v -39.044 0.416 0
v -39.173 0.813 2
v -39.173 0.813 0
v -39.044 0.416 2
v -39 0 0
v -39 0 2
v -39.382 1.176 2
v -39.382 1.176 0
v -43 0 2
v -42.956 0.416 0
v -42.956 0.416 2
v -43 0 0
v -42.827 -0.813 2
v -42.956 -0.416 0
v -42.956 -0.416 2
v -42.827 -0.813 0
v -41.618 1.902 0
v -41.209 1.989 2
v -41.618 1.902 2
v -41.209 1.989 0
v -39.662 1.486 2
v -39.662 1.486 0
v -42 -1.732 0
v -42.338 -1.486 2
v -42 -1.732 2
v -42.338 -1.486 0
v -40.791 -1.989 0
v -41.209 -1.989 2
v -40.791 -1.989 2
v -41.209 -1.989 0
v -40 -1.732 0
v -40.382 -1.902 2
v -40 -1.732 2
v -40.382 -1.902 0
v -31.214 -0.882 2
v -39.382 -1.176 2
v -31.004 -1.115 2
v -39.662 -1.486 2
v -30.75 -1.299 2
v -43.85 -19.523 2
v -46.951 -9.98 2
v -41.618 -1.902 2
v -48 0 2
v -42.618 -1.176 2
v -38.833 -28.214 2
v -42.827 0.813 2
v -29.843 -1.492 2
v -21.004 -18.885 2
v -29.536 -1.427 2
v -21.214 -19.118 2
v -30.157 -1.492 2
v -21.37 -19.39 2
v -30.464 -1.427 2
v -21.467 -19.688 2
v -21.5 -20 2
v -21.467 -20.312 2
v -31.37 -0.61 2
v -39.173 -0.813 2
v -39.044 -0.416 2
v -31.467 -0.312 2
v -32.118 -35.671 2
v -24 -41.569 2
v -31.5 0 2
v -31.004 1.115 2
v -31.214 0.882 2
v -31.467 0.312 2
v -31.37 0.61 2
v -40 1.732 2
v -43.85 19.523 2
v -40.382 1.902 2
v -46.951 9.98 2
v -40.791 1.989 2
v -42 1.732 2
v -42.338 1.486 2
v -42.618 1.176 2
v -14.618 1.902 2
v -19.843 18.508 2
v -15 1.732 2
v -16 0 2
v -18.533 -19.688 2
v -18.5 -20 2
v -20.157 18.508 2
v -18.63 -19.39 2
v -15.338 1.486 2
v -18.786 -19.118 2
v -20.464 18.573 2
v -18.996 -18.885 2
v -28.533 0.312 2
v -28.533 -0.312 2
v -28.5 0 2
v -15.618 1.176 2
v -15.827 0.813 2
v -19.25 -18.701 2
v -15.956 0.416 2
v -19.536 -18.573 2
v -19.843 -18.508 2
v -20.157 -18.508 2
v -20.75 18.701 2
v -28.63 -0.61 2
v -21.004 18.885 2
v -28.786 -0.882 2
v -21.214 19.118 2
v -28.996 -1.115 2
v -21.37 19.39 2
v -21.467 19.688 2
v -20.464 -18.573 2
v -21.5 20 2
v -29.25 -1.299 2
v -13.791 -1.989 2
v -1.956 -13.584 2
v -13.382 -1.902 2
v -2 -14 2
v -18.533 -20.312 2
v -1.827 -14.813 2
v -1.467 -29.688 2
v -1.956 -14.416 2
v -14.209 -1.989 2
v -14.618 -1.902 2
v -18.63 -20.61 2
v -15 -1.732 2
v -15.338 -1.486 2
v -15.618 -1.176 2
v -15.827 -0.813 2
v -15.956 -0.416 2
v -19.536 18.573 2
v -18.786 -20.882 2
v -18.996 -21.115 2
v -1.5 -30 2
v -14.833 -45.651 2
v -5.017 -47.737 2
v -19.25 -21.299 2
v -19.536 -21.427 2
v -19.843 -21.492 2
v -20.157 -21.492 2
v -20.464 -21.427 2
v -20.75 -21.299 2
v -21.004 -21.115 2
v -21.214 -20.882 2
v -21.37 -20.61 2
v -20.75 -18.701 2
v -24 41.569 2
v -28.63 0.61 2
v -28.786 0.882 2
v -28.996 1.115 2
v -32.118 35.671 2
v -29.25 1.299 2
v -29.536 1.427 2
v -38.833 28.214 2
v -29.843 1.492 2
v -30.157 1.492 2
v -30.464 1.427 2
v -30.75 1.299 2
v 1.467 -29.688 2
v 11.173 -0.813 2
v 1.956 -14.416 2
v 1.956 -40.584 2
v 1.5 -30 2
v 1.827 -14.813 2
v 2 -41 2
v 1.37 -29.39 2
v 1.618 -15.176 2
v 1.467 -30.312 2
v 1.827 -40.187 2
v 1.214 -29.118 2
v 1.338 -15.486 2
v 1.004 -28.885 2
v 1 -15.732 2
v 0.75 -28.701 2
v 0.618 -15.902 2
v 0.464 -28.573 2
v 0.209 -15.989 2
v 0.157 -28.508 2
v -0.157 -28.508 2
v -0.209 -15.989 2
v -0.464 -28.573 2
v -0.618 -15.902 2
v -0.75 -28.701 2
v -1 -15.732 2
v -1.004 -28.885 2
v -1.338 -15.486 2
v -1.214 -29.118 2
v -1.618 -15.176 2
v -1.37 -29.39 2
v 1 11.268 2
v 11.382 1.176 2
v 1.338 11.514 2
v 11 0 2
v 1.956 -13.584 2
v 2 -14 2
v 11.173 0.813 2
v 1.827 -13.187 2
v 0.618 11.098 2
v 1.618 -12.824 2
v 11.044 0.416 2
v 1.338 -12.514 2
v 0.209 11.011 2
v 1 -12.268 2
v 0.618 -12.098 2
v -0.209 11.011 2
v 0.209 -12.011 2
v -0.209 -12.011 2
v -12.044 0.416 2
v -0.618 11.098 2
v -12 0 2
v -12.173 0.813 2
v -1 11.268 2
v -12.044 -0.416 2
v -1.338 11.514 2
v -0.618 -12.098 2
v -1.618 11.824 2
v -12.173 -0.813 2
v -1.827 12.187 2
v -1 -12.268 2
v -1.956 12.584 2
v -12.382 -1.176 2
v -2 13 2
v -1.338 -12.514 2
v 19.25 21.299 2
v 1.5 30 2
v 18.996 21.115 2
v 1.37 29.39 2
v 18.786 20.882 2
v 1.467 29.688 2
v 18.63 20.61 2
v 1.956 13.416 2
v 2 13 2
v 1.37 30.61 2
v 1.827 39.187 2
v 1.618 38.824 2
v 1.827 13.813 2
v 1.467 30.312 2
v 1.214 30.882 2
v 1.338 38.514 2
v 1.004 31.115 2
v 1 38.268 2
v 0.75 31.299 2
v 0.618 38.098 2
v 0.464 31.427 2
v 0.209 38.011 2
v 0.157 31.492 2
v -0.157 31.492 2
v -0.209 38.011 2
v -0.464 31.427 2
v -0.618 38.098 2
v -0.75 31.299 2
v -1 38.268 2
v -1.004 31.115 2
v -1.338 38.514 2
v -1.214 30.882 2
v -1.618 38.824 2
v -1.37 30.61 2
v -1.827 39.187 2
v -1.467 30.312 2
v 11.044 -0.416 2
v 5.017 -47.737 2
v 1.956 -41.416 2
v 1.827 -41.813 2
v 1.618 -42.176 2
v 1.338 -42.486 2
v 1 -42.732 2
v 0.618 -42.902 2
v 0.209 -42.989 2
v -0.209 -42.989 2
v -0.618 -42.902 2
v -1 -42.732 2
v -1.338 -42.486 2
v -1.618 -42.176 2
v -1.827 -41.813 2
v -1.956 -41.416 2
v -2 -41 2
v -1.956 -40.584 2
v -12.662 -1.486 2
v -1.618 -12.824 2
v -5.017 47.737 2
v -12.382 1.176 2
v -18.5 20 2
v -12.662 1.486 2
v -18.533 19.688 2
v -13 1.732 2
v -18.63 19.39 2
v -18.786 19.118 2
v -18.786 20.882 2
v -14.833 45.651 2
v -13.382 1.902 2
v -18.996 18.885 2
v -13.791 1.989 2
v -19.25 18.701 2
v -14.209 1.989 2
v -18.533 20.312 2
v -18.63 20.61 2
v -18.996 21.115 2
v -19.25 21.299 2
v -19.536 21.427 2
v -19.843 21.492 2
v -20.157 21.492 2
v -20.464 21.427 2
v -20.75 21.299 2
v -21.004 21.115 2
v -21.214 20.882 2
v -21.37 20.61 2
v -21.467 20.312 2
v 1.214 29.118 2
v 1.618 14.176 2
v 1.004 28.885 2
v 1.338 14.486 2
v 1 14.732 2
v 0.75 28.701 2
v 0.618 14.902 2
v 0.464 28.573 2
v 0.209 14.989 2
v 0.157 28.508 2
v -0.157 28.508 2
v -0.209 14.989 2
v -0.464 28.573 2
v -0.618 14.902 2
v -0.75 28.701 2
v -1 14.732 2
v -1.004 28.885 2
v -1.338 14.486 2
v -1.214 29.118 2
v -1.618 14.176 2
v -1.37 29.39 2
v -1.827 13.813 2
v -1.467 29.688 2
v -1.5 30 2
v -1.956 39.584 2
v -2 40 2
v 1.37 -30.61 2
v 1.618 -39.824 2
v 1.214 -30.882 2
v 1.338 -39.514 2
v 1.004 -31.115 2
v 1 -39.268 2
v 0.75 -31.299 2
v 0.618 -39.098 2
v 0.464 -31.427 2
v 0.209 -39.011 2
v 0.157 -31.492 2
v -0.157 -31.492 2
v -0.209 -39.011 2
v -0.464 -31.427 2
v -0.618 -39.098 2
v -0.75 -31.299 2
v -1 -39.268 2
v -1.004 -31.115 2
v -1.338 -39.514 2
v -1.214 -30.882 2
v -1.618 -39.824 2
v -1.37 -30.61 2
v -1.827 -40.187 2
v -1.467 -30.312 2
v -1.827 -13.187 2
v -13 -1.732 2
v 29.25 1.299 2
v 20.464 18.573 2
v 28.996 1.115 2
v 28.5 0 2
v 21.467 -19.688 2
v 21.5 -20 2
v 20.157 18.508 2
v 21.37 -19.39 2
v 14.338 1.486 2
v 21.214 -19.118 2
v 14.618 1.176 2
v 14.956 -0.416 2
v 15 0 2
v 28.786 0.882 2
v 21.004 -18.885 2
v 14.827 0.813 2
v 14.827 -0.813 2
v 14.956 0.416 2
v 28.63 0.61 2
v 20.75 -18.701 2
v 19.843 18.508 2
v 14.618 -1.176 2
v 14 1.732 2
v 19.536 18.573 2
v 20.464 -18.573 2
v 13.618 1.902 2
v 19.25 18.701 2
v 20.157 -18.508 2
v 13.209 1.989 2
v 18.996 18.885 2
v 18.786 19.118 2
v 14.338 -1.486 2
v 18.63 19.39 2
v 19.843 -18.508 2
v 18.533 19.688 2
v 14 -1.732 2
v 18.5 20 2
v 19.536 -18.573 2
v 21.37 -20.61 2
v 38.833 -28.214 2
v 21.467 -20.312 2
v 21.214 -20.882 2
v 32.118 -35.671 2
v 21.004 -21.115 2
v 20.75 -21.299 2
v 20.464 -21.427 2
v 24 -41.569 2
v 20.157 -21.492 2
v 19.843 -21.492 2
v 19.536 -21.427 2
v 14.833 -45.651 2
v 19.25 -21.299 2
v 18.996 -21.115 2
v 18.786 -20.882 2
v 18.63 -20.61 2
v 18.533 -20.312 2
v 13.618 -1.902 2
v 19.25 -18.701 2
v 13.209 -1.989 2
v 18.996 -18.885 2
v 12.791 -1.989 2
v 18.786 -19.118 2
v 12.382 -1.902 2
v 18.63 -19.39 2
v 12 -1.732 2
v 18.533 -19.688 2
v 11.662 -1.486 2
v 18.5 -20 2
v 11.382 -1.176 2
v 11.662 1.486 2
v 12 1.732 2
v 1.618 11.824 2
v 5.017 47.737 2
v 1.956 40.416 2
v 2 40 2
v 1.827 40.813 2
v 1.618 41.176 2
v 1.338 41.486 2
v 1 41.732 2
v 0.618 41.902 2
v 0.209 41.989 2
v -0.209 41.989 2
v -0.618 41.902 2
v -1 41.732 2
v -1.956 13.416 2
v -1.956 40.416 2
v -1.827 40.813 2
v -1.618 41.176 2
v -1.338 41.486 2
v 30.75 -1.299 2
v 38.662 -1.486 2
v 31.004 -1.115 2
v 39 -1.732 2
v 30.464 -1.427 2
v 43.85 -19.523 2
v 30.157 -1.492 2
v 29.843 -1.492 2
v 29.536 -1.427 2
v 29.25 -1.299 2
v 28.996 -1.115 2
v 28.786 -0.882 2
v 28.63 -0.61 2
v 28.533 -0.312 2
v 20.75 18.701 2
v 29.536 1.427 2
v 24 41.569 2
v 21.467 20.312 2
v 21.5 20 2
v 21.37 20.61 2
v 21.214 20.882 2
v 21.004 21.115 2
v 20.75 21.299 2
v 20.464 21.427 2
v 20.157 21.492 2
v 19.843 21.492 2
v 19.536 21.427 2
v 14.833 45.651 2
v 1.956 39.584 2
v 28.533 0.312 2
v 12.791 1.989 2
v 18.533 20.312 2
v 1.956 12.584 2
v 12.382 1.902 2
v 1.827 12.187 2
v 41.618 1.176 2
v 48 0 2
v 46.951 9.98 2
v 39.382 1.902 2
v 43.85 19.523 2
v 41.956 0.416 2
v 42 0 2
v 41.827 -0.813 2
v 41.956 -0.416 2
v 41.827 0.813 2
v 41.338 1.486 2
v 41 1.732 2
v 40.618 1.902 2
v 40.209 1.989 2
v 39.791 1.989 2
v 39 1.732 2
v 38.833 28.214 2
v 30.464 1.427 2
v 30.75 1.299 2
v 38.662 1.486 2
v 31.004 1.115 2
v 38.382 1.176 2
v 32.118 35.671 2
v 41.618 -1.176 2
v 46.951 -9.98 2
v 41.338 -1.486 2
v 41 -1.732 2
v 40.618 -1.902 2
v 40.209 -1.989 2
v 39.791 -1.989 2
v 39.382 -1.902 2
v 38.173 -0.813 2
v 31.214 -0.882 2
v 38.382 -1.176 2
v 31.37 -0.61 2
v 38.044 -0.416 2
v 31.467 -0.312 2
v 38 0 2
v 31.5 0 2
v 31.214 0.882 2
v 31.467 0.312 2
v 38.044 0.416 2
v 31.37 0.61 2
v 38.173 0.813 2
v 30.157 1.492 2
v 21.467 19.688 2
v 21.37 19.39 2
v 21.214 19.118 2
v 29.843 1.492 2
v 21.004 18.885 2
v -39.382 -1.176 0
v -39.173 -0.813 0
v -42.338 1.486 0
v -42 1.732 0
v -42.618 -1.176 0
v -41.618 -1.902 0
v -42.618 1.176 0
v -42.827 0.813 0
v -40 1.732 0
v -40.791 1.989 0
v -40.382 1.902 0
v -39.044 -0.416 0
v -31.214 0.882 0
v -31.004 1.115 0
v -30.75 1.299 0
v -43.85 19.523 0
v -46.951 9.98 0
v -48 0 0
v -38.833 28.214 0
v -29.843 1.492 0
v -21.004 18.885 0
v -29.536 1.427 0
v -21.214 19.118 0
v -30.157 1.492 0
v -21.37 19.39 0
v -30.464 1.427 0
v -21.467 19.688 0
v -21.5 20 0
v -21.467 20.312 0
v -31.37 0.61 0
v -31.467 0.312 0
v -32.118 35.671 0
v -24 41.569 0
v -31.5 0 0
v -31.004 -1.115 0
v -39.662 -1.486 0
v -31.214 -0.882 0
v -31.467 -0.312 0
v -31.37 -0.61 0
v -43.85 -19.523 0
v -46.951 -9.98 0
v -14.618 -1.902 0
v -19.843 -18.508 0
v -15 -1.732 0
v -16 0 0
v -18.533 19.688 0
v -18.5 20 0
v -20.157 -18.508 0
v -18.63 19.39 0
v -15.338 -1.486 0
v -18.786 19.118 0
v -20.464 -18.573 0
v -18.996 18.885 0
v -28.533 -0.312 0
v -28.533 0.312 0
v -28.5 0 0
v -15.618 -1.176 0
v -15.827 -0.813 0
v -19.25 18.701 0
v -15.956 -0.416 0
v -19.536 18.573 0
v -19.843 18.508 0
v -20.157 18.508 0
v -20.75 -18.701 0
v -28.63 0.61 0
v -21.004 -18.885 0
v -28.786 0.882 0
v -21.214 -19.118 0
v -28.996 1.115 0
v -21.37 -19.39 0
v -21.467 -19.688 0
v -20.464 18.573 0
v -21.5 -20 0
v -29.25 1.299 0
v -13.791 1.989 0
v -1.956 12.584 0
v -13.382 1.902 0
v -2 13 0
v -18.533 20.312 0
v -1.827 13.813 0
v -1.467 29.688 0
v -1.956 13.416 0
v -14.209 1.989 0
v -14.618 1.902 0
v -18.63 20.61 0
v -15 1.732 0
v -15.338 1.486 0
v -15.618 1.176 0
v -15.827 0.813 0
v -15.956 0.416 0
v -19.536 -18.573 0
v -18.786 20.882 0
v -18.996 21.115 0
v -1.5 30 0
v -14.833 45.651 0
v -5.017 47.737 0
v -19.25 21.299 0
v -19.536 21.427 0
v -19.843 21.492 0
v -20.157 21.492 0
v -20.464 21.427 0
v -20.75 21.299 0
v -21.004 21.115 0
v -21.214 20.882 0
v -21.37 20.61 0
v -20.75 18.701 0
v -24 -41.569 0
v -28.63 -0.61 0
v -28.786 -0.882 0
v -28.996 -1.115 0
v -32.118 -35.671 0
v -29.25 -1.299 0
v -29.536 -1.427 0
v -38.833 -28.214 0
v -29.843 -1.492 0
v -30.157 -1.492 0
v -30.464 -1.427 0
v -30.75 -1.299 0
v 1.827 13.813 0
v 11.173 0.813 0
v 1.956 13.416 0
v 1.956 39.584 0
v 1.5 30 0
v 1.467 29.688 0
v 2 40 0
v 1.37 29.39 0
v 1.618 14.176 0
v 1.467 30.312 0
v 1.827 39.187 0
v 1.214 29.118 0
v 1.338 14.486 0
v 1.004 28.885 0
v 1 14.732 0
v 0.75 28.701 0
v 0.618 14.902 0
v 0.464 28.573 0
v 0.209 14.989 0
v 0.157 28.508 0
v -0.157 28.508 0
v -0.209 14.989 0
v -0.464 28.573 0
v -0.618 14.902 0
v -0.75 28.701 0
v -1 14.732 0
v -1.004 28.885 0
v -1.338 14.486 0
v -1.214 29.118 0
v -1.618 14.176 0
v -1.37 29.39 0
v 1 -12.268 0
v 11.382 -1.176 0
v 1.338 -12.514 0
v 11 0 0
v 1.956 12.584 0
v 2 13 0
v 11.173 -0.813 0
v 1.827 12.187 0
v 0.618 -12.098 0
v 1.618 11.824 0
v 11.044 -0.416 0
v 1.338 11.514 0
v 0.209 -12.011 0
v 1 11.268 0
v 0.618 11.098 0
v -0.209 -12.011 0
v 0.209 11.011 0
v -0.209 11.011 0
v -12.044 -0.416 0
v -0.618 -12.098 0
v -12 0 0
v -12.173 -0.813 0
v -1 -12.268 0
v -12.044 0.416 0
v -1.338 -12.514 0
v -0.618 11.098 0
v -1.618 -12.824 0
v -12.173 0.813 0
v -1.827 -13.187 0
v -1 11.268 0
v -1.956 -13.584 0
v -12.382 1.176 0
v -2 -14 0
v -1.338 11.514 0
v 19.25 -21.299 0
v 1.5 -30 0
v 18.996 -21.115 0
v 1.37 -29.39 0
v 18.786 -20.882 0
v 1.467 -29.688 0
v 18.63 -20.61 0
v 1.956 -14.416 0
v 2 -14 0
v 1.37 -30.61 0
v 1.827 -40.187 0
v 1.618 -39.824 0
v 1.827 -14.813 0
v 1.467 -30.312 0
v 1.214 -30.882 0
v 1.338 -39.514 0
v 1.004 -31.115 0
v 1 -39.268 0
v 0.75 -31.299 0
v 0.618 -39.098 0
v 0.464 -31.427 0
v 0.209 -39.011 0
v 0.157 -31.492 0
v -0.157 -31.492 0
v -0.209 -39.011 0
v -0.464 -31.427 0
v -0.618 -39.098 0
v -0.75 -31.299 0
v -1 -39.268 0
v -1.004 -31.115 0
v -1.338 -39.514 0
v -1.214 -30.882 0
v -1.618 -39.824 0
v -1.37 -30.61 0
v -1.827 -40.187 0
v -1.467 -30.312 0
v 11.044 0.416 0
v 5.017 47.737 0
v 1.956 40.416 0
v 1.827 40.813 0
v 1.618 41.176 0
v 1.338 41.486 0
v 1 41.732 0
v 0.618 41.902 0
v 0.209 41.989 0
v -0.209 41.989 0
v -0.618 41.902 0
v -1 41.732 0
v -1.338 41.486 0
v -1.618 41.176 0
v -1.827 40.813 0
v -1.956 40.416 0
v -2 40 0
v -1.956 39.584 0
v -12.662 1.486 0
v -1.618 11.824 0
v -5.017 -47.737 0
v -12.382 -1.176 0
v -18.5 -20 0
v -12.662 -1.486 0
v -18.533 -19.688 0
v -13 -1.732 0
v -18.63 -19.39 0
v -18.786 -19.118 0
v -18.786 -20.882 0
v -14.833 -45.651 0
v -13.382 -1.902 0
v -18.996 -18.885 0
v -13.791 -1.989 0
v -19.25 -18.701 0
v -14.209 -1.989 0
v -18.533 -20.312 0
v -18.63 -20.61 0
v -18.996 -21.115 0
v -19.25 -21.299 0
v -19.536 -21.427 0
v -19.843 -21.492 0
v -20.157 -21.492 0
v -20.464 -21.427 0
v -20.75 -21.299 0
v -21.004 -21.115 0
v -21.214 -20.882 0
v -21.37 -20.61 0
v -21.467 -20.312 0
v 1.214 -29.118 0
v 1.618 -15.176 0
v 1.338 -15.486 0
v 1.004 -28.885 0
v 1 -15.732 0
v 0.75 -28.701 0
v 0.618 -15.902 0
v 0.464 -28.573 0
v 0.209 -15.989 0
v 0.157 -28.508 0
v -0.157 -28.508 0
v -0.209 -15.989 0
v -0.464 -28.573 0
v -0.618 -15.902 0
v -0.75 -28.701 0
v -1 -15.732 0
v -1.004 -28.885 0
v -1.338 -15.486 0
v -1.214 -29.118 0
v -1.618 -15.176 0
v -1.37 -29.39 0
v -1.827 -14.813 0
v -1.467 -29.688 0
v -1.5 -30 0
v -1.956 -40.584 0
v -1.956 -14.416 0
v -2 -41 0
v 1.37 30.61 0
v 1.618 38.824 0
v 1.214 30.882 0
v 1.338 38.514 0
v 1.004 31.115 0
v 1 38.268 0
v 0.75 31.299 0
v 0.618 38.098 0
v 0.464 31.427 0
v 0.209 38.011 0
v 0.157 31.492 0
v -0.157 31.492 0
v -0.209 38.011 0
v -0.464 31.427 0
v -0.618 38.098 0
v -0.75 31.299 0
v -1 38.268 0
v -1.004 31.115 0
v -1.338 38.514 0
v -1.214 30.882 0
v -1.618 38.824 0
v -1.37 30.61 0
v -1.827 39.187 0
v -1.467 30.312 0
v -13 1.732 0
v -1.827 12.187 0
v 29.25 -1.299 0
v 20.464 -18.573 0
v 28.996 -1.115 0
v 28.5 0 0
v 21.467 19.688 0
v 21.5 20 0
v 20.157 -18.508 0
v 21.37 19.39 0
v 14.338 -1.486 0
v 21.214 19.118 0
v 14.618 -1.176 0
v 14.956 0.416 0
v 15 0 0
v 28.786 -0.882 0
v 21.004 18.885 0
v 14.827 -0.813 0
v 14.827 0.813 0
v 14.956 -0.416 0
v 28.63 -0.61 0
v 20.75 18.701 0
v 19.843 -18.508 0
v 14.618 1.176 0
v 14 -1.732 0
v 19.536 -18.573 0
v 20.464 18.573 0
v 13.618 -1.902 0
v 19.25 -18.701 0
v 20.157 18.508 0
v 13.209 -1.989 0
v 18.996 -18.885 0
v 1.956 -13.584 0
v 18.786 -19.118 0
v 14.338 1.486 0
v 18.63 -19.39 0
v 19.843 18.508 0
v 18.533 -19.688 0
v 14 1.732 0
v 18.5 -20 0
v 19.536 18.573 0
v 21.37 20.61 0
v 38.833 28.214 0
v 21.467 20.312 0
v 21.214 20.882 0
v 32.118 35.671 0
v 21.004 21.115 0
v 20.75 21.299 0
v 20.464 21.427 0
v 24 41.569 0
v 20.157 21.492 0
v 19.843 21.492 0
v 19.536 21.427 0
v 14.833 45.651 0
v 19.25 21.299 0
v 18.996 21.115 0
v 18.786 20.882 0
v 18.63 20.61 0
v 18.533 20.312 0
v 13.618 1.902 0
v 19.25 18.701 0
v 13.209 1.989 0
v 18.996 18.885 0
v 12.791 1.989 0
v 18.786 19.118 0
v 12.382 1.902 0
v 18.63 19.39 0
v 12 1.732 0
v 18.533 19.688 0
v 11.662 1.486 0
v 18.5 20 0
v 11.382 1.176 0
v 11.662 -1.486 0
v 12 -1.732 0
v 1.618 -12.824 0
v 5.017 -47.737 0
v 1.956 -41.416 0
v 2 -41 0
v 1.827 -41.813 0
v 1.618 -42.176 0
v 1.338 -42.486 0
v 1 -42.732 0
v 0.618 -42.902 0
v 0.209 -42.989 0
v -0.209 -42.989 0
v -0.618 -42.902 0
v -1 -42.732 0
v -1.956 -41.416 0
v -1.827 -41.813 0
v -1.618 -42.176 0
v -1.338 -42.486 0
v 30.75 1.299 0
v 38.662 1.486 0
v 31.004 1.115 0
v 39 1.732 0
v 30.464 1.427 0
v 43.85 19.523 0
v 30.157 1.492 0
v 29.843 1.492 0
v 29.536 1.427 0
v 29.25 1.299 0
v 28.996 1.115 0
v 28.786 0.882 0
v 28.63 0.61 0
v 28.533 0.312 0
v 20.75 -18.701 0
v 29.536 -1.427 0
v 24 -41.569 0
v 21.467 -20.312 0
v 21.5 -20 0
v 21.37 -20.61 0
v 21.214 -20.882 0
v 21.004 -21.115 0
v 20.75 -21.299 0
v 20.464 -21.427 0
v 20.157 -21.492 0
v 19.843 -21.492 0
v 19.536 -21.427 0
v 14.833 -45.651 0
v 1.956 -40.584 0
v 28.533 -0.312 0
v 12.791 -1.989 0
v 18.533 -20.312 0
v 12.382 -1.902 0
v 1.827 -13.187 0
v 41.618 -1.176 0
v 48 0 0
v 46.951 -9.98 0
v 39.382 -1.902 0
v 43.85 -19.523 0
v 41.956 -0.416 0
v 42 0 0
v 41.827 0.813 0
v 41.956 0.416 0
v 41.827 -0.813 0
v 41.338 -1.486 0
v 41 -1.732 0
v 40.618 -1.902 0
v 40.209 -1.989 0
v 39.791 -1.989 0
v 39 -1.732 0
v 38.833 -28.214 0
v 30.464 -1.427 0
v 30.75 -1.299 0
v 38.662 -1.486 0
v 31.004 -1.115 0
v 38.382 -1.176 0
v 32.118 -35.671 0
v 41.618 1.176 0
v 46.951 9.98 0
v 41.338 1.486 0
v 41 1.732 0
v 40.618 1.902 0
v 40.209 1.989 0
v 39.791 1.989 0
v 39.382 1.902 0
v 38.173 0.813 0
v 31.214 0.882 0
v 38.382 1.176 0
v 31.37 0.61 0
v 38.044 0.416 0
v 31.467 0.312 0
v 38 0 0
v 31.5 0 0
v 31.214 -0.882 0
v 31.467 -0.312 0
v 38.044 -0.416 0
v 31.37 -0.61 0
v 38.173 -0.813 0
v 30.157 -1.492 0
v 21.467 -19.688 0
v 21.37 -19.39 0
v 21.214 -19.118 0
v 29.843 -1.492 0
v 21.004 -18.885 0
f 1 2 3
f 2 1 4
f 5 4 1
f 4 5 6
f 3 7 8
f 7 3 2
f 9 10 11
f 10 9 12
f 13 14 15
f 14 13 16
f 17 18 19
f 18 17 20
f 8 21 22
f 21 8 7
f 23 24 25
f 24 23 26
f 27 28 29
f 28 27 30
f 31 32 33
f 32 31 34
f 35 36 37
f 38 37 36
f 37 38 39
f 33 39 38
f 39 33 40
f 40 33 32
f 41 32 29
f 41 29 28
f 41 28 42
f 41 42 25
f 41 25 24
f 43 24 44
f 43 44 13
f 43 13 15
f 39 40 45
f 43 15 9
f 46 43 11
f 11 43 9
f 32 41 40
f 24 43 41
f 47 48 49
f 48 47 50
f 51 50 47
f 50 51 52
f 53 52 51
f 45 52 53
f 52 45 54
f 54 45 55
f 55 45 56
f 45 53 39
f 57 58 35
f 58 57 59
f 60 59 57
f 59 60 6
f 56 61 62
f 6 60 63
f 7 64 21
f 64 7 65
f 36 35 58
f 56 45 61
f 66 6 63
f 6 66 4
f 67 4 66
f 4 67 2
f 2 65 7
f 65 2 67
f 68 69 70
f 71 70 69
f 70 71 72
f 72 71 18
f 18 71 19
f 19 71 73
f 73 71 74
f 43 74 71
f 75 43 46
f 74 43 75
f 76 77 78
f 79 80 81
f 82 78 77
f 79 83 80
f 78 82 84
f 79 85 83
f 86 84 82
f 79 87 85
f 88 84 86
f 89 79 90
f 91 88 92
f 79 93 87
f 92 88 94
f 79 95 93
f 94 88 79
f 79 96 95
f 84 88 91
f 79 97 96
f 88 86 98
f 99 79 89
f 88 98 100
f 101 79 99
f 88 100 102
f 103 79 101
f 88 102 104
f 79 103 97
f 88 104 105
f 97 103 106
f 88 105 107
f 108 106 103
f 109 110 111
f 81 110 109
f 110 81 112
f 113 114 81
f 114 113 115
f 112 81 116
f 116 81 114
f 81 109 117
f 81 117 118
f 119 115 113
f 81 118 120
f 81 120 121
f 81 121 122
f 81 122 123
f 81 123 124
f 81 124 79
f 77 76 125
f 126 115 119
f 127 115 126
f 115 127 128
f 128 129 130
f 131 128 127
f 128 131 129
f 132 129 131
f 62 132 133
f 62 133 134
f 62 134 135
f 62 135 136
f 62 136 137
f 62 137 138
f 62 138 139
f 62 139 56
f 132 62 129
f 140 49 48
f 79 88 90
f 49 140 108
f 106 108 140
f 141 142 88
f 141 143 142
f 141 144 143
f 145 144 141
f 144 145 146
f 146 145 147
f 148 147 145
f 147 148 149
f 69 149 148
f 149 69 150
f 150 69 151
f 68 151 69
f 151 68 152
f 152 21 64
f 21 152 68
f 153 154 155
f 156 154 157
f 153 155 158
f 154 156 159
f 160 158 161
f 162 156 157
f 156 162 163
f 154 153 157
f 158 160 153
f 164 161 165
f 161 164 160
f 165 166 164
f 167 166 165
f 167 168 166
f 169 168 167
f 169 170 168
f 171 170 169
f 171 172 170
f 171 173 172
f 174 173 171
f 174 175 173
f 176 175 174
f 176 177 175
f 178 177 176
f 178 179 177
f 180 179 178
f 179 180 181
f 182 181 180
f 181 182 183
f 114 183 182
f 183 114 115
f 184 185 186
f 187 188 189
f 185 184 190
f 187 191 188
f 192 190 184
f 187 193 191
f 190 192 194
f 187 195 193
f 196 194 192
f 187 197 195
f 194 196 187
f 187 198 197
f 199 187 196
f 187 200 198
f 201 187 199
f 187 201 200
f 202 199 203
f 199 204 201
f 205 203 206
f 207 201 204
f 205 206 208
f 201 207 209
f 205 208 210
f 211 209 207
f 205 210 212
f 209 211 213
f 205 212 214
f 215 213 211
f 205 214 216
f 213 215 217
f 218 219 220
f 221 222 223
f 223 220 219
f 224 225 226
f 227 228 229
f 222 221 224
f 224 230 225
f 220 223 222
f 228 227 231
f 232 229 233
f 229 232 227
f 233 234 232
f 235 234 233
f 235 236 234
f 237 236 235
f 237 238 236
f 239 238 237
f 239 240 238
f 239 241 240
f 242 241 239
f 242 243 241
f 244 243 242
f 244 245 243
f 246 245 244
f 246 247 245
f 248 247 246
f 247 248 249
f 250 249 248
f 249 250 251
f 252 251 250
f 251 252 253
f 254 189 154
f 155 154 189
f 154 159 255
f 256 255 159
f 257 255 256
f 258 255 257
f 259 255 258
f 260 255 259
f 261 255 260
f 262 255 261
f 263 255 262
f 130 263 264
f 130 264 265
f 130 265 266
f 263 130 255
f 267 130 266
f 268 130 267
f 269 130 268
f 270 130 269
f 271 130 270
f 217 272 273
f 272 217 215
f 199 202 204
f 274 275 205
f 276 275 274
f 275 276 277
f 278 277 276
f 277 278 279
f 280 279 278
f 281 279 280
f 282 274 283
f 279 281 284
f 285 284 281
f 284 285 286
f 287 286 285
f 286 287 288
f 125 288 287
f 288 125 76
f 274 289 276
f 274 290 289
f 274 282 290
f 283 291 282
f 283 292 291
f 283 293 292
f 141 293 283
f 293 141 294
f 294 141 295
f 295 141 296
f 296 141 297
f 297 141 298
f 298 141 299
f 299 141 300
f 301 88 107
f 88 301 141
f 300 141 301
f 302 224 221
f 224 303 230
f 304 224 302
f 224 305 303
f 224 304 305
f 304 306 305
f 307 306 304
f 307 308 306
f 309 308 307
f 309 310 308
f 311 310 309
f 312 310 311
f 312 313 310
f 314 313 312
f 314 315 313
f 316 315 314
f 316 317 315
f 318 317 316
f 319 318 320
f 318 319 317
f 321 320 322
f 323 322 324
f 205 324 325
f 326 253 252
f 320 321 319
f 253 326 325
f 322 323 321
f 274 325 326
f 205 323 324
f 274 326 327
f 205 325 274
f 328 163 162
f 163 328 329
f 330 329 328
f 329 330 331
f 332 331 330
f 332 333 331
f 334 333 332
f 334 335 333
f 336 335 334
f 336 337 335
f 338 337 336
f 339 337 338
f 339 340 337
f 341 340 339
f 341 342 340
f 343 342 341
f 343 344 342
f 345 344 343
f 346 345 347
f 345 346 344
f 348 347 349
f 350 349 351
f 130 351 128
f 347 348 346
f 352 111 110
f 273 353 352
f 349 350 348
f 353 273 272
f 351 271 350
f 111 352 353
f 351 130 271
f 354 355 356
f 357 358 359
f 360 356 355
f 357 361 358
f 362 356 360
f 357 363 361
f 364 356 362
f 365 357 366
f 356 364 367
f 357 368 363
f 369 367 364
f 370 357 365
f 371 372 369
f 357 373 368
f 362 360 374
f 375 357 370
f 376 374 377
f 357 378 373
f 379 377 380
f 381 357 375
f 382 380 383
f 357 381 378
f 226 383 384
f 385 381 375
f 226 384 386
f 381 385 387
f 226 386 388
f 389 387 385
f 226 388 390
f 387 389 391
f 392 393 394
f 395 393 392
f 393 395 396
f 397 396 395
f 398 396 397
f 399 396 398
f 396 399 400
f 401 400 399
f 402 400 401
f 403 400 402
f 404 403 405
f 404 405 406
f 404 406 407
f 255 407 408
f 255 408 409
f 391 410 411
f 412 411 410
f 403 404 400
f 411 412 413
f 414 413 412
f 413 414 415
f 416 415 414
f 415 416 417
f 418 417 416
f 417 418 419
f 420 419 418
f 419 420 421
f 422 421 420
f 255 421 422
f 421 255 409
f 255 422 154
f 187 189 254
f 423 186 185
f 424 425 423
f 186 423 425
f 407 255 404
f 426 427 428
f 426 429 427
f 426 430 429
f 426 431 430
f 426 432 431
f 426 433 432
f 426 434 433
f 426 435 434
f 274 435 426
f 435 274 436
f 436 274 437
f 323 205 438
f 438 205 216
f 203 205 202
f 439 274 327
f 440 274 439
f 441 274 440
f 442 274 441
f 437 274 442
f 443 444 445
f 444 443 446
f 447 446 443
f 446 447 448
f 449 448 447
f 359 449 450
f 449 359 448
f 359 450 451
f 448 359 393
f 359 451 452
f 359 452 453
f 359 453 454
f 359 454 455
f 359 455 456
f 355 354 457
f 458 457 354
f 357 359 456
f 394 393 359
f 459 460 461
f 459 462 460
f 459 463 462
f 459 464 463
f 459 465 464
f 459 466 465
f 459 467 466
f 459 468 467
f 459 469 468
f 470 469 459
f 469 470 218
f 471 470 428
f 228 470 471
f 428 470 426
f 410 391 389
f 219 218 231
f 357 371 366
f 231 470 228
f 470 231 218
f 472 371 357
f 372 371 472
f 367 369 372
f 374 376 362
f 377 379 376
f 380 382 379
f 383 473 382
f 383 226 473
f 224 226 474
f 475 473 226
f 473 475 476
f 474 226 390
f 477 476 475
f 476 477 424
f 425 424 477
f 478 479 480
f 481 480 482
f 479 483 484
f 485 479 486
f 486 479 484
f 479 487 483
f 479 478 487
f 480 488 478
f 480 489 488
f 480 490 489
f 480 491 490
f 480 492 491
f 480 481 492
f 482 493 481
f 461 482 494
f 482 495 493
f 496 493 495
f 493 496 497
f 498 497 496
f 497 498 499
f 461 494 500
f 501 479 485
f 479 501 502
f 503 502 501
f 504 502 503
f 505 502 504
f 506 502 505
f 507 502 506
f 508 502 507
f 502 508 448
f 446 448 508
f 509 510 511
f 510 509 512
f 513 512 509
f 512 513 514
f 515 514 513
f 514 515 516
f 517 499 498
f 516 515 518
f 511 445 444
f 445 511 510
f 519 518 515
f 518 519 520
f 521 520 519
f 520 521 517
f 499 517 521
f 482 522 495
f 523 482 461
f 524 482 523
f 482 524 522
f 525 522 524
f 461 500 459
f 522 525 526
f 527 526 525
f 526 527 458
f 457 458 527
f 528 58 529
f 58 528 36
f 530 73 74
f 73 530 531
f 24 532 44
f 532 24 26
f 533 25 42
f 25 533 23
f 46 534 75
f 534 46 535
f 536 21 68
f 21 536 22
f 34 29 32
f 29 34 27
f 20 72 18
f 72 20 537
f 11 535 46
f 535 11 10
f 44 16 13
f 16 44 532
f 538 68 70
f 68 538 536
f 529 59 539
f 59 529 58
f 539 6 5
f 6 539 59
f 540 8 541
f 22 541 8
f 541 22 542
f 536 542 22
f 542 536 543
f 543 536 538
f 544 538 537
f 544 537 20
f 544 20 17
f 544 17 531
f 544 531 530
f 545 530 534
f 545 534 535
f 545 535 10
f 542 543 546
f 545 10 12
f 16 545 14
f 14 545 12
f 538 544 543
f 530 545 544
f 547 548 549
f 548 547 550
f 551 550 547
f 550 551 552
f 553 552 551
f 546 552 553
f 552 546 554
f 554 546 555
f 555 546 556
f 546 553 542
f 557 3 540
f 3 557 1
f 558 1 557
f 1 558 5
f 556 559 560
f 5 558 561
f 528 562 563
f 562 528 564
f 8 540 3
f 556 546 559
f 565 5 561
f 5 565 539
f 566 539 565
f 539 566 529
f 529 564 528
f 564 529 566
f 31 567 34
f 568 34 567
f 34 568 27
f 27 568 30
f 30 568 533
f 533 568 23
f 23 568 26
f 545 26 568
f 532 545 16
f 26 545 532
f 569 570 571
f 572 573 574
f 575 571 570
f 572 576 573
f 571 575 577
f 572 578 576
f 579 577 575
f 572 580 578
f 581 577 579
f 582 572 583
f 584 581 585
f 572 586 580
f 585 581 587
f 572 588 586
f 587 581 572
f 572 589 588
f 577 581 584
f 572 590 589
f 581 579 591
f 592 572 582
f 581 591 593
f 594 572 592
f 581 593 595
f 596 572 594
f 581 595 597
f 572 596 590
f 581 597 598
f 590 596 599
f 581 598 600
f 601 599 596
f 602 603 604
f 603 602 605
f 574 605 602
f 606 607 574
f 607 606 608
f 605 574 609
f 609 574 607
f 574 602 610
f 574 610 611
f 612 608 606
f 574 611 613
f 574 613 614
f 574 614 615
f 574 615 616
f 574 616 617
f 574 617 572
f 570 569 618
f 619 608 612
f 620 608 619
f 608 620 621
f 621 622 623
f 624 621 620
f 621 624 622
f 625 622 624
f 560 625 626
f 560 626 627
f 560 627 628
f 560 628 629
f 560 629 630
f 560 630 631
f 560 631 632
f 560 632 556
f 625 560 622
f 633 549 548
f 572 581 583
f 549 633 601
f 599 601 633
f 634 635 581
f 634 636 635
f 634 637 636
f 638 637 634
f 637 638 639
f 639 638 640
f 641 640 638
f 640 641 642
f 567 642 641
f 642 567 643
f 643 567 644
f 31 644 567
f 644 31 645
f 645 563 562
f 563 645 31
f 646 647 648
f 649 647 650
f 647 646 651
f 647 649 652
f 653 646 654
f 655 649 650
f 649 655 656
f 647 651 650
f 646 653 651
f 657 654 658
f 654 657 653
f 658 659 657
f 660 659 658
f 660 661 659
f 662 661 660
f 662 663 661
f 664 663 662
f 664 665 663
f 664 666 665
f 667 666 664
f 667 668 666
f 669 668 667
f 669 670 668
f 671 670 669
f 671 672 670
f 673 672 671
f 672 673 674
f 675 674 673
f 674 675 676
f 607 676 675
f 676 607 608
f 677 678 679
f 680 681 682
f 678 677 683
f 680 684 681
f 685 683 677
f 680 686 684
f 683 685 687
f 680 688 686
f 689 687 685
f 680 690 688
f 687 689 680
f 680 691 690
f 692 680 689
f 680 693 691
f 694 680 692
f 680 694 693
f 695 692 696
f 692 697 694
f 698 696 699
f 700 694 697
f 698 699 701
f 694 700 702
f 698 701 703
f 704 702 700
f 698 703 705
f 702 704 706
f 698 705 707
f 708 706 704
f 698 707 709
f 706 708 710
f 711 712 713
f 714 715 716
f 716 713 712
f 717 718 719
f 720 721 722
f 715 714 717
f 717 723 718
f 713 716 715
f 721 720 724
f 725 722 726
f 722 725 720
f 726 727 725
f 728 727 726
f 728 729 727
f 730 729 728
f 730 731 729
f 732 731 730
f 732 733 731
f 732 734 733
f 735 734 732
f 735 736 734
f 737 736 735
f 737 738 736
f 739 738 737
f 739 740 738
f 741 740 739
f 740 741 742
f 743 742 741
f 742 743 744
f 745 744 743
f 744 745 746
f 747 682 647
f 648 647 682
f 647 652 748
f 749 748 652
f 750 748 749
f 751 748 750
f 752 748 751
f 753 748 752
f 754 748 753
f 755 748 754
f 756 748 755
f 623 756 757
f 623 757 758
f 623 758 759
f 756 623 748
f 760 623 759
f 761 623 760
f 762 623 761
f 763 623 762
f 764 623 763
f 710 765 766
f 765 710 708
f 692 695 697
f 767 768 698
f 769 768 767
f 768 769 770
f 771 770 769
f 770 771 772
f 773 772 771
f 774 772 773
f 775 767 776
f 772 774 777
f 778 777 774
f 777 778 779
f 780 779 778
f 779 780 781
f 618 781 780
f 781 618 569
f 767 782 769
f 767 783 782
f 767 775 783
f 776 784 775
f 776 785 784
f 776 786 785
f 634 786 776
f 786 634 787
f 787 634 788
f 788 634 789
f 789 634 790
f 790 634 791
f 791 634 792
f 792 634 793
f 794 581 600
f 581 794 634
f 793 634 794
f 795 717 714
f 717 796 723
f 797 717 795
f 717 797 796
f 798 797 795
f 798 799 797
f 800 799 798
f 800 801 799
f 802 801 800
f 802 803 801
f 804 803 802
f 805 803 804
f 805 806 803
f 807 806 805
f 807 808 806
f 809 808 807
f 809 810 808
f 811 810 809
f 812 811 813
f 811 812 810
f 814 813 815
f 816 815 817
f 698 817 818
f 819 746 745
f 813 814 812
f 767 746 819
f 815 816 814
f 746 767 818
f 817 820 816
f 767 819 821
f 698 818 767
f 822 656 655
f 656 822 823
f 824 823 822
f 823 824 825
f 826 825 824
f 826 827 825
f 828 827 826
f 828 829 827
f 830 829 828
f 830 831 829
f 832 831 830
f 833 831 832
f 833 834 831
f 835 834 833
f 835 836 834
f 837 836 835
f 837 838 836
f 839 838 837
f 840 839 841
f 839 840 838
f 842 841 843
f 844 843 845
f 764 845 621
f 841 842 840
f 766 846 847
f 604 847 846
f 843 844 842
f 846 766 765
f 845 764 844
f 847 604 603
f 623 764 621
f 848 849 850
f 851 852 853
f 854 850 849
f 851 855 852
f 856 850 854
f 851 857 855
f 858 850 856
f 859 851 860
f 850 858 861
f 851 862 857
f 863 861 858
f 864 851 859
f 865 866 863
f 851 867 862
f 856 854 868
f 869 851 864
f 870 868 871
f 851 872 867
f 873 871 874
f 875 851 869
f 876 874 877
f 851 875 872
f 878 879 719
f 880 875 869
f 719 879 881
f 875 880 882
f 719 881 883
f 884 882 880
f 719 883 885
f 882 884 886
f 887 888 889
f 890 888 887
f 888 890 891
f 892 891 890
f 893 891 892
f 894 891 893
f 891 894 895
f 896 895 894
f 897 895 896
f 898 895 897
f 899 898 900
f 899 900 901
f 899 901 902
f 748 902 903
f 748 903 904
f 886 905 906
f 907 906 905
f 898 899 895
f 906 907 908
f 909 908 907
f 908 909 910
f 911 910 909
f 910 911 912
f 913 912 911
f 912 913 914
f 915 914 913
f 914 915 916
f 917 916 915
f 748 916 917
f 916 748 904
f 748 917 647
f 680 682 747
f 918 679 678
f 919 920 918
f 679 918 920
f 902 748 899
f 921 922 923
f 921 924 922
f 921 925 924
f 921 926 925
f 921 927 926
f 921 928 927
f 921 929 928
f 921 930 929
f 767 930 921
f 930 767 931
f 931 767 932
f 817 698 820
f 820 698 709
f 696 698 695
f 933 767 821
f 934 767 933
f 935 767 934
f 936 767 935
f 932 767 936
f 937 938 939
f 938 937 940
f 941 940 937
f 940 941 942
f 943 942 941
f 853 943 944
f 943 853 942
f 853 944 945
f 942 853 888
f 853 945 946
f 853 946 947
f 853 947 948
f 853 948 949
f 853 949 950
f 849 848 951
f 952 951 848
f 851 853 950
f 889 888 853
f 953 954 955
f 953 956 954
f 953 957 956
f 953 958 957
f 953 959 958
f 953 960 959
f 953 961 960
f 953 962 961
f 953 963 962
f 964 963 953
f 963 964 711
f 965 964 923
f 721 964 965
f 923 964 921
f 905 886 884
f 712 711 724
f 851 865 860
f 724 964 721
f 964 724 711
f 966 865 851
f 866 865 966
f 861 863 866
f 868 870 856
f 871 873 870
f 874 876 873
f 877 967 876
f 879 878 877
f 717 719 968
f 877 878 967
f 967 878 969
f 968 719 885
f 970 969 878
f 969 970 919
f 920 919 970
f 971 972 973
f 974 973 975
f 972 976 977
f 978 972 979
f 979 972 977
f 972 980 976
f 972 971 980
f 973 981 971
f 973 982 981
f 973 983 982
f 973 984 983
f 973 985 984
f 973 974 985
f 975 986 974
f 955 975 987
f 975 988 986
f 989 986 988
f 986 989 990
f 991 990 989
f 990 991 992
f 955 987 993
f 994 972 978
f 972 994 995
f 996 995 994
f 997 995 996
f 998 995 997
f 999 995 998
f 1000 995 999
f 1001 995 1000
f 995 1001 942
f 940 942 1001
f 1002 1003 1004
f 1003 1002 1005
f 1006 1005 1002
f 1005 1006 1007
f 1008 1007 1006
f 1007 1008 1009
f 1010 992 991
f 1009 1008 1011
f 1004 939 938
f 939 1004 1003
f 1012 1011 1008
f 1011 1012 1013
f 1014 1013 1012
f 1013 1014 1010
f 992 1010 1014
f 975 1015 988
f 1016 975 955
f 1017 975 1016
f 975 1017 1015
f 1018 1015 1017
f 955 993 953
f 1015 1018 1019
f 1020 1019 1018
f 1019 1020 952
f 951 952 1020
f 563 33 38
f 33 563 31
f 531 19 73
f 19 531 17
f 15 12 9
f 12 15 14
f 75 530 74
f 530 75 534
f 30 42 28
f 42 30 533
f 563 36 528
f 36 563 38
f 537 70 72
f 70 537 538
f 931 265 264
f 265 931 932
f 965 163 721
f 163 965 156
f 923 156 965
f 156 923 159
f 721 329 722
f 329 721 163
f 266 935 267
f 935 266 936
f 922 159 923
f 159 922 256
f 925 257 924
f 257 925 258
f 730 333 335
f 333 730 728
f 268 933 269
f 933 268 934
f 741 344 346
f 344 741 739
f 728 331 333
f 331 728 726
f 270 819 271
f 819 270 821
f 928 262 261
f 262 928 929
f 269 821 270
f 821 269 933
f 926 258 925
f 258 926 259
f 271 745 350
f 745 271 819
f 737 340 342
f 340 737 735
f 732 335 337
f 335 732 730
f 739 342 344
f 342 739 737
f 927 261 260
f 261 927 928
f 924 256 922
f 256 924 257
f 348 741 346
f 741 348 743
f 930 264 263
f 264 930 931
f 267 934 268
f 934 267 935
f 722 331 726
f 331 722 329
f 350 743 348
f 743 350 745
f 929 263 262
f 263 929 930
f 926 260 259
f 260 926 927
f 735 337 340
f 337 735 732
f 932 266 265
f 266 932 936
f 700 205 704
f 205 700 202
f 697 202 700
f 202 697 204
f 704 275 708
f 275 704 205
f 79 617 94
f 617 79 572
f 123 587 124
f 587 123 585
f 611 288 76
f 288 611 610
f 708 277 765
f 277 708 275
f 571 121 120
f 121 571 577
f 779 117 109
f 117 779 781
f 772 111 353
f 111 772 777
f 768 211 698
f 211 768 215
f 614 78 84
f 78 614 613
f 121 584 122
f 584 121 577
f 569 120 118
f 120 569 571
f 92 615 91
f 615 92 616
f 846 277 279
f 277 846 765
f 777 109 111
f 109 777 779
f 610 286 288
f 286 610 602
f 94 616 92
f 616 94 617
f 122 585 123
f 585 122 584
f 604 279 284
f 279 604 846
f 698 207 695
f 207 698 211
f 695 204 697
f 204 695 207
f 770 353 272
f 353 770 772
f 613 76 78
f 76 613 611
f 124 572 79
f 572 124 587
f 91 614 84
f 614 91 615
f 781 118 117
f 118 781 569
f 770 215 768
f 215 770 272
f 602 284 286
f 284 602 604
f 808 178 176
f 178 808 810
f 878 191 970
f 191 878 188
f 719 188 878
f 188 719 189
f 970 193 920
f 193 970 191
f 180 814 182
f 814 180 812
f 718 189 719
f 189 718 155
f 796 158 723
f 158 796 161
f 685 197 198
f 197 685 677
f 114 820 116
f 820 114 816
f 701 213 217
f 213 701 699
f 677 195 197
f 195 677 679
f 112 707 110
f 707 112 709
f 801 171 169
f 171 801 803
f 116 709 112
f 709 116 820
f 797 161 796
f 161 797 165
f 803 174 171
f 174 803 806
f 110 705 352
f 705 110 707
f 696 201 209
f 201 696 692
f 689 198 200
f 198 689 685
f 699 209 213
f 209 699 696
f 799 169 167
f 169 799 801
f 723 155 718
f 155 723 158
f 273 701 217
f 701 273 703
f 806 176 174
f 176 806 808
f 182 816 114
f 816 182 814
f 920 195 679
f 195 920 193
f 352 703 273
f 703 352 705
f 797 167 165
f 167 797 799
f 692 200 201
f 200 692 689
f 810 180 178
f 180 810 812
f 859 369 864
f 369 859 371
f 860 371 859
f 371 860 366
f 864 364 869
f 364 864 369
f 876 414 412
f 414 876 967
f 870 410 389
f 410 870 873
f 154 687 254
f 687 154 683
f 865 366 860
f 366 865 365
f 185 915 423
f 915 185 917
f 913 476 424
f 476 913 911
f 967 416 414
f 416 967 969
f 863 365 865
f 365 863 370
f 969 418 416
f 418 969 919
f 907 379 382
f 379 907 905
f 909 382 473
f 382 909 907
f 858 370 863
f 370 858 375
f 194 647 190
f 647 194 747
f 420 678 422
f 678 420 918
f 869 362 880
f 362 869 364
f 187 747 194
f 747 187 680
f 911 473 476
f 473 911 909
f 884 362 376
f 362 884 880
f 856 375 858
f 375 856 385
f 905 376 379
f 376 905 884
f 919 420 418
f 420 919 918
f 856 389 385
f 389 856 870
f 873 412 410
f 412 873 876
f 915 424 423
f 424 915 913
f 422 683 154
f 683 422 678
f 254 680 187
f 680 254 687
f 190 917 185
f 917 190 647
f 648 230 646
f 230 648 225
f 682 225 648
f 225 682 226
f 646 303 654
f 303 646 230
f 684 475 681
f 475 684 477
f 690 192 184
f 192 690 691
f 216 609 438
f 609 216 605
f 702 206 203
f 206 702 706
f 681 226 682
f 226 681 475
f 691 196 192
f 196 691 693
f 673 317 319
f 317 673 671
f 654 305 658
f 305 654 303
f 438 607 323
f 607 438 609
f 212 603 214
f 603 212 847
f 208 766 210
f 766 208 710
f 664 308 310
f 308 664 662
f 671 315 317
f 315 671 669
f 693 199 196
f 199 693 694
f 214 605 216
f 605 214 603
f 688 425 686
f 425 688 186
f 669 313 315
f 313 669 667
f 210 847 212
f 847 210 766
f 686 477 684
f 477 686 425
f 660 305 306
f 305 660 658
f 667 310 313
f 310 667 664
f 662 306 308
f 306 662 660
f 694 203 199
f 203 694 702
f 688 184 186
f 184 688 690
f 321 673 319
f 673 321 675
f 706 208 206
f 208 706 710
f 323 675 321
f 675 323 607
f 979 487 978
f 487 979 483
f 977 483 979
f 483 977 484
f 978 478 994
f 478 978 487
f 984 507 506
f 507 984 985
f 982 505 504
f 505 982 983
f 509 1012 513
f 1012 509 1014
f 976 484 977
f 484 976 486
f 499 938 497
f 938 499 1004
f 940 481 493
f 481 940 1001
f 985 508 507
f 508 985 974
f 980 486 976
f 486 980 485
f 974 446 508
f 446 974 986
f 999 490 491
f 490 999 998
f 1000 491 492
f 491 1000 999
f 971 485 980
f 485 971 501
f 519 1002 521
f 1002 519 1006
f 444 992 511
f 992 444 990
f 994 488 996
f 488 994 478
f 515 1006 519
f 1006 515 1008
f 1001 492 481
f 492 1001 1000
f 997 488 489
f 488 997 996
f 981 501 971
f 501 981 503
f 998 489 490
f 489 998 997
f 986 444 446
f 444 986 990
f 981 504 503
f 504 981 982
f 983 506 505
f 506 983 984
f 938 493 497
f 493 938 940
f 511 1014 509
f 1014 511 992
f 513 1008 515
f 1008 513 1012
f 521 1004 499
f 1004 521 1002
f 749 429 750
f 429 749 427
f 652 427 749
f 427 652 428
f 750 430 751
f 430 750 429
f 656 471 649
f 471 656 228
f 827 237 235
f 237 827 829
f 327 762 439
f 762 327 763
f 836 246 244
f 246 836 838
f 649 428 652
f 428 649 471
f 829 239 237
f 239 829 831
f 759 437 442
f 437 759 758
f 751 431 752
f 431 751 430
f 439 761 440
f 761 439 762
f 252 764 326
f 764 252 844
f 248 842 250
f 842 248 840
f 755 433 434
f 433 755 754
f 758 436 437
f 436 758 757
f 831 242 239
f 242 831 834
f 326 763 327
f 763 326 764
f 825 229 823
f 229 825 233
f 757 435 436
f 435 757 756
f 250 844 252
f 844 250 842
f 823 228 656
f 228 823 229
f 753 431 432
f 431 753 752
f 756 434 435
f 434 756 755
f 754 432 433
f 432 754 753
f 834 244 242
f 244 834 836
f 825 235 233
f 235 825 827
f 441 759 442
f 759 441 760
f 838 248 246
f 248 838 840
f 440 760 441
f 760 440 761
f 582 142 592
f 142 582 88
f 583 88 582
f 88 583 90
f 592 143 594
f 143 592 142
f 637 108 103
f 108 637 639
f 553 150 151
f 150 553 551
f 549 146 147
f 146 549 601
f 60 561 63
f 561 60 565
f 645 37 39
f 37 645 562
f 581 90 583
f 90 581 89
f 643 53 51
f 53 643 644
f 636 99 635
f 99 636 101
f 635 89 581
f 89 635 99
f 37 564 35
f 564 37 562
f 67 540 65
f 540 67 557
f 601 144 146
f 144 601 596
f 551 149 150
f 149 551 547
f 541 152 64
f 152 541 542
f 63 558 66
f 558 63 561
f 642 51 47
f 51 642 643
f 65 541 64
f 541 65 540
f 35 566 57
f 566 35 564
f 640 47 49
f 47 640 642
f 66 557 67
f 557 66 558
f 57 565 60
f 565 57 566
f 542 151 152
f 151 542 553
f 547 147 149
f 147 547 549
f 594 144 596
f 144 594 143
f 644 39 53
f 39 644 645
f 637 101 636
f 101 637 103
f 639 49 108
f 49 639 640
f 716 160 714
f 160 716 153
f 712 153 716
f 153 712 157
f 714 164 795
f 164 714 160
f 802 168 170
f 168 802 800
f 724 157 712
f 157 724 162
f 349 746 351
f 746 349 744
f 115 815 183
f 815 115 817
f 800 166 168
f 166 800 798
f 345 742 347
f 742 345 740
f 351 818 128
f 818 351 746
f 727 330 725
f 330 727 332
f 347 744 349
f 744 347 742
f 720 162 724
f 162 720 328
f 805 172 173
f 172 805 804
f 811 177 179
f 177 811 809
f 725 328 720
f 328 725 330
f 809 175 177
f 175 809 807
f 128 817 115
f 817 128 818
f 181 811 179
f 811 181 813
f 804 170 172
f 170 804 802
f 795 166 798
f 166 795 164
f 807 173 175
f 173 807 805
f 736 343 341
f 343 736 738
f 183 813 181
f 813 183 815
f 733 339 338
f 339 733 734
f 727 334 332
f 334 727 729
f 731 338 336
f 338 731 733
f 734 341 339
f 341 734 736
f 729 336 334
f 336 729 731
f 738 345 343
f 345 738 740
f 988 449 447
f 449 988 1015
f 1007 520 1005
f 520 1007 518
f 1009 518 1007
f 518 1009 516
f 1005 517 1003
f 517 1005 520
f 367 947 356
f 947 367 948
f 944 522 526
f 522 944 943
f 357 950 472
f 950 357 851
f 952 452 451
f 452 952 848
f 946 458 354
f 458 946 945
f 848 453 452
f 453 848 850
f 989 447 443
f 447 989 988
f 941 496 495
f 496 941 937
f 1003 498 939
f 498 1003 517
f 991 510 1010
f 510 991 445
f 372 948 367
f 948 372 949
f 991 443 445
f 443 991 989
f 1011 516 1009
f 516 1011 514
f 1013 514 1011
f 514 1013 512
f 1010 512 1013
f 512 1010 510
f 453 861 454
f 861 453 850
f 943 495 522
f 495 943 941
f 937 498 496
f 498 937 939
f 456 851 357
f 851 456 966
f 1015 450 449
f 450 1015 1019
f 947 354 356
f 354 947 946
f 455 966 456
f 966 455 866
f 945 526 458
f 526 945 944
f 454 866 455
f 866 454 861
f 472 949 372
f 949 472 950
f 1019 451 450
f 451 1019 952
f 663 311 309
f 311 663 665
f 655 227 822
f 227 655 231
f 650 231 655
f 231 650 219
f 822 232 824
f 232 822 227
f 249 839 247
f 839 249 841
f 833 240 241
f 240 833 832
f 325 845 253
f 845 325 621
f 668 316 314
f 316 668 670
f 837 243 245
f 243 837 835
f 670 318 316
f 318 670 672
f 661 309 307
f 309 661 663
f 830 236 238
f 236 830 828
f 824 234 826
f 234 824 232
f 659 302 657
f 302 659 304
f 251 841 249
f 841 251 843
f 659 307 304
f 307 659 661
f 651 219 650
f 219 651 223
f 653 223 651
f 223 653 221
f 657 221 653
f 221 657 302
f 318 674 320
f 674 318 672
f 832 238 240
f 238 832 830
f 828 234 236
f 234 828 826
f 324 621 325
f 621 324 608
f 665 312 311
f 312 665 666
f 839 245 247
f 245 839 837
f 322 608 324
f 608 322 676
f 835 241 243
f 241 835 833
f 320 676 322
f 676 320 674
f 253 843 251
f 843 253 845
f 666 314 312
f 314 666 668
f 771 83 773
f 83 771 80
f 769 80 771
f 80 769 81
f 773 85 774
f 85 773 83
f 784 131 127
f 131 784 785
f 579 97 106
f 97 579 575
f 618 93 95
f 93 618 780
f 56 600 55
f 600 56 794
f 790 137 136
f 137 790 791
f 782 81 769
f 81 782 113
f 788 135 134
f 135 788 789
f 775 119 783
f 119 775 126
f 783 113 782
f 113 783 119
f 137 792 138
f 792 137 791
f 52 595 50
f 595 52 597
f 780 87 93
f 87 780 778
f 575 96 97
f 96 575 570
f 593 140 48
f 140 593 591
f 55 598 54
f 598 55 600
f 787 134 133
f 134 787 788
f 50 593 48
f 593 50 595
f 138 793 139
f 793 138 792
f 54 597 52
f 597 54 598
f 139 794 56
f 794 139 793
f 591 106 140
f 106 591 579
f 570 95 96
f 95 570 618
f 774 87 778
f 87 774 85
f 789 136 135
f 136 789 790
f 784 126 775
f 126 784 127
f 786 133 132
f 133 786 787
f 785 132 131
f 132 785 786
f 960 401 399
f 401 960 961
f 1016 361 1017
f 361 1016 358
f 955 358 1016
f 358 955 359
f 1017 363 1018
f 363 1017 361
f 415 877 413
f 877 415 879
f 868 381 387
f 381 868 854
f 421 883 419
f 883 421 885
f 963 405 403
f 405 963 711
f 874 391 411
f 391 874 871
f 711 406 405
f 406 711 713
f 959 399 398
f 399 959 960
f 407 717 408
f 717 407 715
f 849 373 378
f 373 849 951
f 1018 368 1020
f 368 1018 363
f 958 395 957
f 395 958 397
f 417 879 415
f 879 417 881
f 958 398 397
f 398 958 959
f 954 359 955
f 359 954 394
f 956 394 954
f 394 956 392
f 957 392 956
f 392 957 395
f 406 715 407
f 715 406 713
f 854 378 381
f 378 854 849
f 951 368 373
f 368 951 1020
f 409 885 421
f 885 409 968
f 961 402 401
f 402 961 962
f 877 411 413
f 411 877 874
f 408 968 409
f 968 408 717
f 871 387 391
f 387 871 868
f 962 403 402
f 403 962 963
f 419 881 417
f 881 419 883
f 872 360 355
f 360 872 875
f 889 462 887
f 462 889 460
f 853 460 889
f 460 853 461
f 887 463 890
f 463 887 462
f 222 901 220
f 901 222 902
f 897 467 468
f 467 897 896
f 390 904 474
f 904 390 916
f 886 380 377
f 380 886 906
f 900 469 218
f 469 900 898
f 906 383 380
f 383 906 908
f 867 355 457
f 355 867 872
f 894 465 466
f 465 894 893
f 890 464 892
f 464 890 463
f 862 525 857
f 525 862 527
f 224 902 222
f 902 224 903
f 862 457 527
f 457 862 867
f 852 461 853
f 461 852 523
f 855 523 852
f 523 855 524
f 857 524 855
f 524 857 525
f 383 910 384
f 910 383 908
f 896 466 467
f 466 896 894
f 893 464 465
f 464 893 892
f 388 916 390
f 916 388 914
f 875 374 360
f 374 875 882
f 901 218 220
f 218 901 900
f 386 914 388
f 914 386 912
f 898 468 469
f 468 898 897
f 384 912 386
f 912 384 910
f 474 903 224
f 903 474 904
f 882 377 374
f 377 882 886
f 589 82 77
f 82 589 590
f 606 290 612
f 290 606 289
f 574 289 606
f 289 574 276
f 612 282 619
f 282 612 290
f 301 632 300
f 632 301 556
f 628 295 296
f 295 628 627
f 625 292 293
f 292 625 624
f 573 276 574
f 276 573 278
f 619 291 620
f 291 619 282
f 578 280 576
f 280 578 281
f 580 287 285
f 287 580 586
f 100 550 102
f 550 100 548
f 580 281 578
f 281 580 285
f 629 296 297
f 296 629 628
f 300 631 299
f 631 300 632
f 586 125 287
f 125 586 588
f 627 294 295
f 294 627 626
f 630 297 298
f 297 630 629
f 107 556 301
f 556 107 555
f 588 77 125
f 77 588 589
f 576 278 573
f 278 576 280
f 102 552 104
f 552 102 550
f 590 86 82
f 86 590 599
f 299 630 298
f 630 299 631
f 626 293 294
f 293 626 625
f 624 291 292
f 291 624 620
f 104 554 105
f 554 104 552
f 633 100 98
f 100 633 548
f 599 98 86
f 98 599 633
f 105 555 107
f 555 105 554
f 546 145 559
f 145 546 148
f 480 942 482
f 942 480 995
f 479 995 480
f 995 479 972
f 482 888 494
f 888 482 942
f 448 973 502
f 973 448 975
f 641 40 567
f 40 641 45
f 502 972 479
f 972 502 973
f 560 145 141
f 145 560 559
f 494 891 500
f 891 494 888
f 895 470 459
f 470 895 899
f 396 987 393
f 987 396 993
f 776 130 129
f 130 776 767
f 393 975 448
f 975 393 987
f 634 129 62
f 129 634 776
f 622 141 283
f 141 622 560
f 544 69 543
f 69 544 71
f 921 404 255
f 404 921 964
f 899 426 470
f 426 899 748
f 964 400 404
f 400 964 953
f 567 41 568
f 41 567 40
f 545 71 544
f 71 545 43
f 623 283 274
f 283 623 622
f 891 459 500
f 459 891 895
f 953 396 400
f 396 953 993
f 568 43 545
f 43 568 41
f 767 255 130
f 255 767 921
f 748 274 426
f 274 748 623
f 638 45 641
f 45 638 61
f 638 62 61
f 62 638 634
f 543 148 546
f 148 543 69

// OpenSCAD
// Eduardo Blanco Bielsa - UO285176
module cubierta2(h, dg, dp, fn){
    difference(){
        cylinder (h = h, d=dg, $fn=fn);
        
        for (i =[-41: 27 :41 ]) {
            translate([i, 0, 0])
                cylinder (h = h, d=dp, $fn=fn);
            translate([0, i, 0])
                cylinder (h = h, d=dp, $fn=fn);
        }
        for (i =[-30: 60 :30 ]) {
            translate([i, 0, 0])
                cylinder (h = h, d=dp-1, $fn=fn);
            translate([0, i, 0])
                cylinder (h = h, d=dp-1, $fn=fn);
        }
        for(i =[-20: 40 :20 ]){
            translate([i, i, 0])
                cylinder (h = h, d=dp-1, $fn=fn); 
            translate([-i, i, 0])
                cylinder (h = h, d=dp-1, $fn=fn);    
        }
    }
}

cubierta2(2, 96, 4, 30);
